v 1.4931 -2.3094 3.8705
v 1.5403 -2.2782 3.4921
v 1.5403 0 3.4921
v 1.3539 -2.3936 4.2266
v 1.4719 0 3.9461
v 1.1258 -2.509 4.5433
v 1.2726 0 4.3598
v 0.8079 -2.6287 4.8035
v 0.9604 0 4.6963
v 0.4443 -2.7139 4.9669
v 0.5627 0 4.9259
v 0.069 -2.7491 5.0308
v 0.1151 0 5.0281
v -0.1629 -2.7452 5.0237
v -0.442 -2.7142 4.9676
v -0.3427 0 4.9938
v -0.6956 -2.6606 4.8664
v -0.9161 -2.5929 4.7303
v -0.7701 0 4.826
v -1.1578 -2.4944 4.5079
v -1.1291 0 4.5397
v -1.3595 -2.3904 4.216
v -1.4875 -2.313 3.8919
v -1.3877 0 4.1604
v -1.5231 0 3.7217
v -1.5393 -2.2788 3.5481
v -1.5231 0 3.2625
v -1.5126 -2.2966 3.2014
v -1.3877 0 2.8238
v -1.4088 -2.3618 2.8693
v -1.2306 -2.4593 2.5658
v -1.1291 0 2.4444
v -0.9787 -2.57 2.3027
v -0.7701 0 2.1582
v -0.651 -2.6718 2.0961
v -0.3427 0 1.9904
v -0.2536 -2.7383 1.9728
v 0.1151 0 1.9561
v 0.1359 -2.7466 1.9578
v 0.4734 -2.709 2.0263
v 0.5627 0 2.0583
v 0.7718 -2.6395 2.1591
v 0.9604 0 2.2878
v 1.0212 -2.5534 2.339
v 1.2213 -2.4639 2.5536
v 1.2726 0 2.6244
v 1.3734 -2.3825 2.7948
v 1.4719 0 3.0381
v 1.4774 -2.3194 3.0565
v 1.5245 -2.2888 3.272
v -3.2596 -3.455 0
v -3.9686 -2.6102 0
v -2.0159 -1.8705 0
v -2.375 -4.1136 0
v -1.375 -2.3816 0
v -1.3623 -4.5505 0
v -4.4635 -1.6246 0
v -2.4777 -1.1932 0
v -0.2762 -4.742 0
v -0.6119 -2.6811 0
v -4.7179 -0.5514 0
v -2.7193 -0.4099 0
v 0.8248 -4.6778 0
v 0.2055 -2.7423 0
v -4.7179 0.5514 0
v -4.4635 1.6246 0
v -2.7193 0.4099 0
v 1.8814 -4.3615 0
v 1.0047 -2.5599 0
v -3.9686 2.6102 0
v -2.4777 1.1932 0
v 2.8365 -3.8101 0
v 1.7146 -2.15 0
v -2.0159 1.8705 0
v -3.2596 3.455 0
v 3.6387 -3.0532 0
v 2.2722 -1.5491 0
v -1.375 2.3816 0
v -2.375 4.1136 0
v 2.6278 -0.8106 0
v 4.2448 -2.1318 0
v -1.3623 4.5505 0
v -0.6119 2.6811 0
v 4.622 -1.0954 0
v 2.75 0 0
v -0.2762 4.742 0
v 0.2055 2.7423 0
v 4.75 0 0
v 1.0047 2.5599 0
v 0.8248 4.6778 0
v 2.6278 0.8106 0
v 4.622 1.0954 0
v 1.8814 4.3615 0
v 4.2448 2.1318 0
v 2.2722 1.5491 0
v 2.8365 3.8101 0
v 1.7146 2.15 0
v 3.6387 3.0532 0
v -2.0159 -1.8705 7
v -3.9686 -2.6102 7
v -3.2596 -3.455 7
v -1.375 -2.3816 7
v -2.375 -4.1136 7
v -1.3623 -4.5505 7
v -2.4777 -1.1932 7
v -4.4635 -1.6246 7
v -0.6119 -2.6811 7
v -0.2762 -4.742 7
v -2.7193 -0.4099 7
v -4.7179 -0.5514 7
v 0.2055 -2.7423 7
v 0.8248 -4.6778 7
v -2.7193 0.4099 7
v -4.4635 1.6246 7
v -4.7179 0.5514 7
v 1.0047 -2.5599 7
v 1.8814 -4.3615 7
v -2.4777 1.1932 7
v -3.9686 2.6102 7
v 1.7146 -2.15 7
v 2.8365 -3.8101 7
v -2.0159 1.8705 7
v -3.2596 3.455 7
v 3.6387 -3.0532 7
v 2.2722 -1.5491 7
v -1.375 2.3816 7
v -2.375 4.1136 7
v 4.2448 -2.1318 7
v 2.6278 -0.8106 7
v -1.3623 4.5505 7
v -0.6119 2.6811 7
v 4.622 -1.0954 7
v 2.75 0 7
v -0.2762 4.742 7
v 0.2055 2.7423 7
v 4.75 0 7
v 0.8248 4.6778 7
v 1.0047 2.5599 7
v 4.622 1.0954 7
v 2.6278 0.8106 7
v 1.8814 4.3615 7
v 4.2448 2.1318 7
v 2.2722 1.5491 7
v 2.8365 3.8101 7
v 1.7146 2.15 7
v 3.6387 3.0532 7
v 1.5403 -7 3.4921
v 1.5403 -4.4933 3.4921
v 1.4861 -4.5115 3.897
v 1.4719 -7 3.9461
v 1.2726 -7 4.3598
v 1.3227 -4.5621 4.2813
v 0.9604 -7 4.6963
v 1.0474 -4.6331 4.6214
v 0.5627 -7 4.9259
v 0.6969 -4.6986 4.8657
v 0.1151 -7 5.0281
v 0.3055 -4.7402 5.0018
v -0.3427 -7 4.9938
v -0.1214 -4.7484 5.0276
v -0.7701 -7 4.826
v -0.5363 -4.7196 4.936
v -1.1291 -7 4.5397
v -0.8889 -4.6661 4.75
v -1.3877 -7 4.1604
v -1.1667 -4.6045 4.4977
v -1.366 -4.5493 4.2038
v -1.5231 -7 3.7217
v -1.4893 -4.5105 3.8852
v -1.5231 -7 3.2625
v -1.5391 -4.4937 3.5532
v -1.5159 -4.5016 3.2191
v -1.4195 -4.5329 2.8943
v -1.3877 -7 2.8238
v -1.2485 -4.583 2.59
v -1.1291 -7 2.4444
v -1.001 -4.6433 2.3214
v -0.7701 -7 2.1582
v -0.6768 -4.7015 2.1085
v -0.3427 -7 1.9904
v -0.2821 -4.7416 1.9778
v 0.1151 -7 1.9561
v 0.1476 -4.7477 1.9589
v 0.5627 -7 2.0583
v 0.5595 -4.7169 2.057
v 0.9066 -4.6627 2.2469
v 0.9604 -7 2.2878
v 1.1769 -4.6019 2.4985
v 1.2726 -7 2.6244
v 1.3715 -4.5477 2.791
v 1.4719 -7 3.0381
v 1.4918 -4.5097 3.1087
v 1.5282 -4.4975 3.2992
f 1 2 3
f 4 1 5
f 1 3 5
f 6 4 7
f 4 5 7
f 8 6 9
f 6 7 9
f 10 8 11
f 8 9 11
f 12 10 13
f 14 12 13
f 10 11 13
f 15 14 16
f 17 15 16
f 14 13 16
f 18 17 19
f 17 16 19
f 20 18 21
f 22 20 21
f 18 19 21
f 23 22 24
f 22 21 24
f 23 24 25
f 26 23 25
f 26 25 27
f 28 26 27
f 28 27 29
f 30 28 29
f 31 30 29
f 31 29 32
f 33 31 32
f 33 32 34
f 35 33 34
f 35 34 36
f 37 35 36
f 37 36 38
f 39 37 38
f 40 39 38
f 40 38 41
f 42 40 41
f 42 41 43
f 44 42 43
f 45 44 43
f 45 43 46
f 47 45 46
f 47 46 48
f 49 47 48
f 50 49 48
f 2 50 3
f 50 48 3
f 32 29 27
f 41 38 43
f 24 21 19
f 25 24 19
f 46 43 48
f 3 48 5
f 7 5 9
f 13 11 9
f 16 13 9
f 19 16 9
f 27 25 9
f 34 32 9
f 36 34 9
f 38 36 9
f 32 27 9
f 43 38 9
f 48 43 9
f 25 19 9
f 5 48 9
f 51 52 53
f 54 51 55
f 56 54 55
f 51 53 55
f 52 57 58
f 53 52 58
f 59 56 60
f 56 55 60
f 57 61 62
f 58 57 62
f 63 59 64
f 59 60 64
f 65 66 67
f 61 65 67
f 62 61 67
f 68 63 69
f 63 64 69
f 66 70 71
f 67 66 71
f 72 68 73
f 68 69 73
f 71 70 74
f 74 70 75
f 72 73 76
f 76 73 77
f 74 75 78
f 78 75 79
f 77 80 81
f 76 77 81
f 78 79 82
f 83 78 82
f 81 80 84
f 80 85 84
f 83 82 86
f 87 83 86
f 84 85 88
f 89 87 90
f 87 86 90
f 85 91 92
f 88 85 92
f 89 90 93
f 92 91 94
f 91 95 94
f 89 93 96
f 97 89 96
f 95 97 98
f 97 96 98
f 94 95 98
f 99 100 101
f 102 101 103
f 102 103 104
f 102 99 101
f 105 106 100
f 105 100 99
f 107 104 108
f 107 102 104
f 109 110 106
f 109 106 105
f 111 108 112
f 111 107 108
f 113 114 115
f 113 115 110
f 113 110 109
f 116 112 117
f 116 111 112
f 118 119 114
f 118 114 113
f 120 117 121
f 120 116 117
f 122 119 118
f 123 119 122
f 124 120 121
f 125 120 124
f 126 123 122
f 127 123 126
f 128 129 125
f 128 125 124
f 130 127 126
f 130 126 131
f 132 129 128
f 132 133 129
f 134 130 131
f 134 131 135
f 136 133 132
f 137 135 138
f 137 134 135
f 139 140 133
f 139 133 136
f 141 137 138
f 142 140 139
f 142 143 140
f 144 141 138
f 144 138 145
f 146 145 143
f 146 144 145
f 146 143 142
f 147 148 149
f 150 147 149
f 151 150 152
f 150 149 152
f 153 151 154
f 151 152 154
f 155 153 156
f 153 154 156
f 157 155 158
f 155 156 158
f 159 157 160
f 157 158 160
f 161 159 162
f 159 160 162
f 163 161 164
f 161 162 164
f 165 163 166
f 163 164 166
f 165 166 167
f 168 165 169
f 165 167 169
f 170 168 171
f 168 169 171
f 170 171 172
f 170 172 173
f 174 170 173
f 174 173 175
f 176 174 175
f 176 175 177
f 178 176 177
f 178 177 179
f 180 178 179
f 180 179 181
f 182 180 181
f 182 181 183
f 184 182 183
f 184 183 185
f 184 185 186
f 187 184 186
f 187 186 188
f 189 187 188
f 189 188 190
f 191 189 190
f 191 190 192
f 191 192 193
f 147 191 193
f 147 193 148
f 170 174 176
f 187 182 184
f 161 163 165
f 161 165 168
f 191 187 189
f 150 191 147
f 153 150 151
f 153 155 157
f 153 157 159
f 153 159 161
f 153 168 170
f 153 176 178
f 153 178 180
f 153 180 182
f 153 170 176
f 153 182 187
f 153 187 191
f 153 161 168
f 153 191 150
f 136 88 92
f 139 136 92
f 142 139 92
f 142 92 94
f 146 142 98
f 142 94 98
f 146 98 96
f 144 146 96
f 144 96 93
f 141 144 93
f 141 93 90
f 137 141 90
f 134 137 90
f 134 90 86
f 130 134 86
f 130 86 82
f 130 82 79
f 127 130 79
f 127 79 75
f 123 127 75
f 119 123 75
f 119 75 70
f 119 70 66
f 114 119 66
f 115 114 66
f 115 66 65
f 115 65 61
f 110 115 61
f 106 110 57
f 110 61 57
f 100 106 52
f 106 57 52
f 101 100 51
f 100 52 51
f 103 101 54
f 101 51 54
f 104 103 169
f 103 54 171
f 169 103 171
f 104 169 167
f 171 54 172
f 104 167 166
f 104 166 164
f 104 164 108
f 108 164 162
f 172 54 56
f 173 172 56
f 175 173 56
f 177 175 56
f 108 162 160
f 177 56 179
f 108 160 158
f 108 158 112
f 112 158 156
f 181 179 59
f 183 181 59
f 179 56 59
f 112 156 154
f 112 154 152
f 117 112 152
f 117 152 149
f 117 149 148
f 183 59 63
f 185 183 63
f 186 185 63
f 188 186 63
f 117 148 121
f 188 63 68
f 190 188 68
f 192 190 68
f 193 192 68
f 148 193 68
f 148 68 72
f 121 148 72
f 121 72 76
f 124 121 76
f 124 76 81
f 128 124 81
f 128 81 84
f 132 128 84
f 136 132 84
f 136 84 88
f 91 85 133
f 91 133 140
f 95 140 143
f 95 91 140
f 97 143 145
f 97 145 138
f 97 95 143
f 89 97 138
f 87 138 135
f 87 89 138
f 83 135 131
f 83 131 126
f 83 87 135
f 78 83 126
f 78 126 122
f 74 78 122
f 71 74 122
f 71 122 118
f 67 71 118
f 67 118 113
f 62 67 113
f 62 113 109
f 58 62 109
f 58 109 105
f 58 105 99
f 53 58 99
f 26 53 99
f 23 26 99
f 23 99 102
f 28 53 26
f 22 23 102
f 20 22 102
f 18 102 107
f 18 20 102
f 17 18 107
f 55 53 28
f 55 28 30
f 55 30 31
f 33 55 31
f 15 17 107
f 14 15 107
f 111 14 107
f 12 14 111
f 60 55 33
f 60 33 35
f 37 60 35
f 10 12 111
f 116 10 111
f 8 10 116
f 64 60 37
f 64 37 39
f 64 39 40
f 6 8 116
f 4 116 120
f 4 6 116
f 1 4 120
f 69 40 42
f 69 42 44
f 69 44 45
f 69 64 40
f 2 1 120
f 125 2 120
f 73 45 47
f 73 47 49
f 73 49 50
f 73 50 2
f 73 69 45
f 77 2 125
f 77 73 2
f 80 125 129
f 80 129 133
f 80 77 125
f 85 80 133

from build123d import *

# Parameters (mm, degrees)
F0_R     = 4.75
F0_R_2   = 2.75
F1_DEPTH = 7
F2_R     = 1.540286
F3_DEPTH = 7


with BuildPart() as f1:
    # F0 (on Top) → F1 (new body)
    with BuildSketch(Plane.XY):
        Circle(F0_R)
        Circle(F0_R_2, mode=Mode.SUBTRACT)
    extrude(amount=F1_DEPTH)

    # F2 (on Front) → F3 (join)
    with BuildSketch(Plane.XZ):
        with Locations((0, 3.492086)):
            Circle(F2_R)
    extrude(amount=F3_DEPTH)


solid = f1.part
